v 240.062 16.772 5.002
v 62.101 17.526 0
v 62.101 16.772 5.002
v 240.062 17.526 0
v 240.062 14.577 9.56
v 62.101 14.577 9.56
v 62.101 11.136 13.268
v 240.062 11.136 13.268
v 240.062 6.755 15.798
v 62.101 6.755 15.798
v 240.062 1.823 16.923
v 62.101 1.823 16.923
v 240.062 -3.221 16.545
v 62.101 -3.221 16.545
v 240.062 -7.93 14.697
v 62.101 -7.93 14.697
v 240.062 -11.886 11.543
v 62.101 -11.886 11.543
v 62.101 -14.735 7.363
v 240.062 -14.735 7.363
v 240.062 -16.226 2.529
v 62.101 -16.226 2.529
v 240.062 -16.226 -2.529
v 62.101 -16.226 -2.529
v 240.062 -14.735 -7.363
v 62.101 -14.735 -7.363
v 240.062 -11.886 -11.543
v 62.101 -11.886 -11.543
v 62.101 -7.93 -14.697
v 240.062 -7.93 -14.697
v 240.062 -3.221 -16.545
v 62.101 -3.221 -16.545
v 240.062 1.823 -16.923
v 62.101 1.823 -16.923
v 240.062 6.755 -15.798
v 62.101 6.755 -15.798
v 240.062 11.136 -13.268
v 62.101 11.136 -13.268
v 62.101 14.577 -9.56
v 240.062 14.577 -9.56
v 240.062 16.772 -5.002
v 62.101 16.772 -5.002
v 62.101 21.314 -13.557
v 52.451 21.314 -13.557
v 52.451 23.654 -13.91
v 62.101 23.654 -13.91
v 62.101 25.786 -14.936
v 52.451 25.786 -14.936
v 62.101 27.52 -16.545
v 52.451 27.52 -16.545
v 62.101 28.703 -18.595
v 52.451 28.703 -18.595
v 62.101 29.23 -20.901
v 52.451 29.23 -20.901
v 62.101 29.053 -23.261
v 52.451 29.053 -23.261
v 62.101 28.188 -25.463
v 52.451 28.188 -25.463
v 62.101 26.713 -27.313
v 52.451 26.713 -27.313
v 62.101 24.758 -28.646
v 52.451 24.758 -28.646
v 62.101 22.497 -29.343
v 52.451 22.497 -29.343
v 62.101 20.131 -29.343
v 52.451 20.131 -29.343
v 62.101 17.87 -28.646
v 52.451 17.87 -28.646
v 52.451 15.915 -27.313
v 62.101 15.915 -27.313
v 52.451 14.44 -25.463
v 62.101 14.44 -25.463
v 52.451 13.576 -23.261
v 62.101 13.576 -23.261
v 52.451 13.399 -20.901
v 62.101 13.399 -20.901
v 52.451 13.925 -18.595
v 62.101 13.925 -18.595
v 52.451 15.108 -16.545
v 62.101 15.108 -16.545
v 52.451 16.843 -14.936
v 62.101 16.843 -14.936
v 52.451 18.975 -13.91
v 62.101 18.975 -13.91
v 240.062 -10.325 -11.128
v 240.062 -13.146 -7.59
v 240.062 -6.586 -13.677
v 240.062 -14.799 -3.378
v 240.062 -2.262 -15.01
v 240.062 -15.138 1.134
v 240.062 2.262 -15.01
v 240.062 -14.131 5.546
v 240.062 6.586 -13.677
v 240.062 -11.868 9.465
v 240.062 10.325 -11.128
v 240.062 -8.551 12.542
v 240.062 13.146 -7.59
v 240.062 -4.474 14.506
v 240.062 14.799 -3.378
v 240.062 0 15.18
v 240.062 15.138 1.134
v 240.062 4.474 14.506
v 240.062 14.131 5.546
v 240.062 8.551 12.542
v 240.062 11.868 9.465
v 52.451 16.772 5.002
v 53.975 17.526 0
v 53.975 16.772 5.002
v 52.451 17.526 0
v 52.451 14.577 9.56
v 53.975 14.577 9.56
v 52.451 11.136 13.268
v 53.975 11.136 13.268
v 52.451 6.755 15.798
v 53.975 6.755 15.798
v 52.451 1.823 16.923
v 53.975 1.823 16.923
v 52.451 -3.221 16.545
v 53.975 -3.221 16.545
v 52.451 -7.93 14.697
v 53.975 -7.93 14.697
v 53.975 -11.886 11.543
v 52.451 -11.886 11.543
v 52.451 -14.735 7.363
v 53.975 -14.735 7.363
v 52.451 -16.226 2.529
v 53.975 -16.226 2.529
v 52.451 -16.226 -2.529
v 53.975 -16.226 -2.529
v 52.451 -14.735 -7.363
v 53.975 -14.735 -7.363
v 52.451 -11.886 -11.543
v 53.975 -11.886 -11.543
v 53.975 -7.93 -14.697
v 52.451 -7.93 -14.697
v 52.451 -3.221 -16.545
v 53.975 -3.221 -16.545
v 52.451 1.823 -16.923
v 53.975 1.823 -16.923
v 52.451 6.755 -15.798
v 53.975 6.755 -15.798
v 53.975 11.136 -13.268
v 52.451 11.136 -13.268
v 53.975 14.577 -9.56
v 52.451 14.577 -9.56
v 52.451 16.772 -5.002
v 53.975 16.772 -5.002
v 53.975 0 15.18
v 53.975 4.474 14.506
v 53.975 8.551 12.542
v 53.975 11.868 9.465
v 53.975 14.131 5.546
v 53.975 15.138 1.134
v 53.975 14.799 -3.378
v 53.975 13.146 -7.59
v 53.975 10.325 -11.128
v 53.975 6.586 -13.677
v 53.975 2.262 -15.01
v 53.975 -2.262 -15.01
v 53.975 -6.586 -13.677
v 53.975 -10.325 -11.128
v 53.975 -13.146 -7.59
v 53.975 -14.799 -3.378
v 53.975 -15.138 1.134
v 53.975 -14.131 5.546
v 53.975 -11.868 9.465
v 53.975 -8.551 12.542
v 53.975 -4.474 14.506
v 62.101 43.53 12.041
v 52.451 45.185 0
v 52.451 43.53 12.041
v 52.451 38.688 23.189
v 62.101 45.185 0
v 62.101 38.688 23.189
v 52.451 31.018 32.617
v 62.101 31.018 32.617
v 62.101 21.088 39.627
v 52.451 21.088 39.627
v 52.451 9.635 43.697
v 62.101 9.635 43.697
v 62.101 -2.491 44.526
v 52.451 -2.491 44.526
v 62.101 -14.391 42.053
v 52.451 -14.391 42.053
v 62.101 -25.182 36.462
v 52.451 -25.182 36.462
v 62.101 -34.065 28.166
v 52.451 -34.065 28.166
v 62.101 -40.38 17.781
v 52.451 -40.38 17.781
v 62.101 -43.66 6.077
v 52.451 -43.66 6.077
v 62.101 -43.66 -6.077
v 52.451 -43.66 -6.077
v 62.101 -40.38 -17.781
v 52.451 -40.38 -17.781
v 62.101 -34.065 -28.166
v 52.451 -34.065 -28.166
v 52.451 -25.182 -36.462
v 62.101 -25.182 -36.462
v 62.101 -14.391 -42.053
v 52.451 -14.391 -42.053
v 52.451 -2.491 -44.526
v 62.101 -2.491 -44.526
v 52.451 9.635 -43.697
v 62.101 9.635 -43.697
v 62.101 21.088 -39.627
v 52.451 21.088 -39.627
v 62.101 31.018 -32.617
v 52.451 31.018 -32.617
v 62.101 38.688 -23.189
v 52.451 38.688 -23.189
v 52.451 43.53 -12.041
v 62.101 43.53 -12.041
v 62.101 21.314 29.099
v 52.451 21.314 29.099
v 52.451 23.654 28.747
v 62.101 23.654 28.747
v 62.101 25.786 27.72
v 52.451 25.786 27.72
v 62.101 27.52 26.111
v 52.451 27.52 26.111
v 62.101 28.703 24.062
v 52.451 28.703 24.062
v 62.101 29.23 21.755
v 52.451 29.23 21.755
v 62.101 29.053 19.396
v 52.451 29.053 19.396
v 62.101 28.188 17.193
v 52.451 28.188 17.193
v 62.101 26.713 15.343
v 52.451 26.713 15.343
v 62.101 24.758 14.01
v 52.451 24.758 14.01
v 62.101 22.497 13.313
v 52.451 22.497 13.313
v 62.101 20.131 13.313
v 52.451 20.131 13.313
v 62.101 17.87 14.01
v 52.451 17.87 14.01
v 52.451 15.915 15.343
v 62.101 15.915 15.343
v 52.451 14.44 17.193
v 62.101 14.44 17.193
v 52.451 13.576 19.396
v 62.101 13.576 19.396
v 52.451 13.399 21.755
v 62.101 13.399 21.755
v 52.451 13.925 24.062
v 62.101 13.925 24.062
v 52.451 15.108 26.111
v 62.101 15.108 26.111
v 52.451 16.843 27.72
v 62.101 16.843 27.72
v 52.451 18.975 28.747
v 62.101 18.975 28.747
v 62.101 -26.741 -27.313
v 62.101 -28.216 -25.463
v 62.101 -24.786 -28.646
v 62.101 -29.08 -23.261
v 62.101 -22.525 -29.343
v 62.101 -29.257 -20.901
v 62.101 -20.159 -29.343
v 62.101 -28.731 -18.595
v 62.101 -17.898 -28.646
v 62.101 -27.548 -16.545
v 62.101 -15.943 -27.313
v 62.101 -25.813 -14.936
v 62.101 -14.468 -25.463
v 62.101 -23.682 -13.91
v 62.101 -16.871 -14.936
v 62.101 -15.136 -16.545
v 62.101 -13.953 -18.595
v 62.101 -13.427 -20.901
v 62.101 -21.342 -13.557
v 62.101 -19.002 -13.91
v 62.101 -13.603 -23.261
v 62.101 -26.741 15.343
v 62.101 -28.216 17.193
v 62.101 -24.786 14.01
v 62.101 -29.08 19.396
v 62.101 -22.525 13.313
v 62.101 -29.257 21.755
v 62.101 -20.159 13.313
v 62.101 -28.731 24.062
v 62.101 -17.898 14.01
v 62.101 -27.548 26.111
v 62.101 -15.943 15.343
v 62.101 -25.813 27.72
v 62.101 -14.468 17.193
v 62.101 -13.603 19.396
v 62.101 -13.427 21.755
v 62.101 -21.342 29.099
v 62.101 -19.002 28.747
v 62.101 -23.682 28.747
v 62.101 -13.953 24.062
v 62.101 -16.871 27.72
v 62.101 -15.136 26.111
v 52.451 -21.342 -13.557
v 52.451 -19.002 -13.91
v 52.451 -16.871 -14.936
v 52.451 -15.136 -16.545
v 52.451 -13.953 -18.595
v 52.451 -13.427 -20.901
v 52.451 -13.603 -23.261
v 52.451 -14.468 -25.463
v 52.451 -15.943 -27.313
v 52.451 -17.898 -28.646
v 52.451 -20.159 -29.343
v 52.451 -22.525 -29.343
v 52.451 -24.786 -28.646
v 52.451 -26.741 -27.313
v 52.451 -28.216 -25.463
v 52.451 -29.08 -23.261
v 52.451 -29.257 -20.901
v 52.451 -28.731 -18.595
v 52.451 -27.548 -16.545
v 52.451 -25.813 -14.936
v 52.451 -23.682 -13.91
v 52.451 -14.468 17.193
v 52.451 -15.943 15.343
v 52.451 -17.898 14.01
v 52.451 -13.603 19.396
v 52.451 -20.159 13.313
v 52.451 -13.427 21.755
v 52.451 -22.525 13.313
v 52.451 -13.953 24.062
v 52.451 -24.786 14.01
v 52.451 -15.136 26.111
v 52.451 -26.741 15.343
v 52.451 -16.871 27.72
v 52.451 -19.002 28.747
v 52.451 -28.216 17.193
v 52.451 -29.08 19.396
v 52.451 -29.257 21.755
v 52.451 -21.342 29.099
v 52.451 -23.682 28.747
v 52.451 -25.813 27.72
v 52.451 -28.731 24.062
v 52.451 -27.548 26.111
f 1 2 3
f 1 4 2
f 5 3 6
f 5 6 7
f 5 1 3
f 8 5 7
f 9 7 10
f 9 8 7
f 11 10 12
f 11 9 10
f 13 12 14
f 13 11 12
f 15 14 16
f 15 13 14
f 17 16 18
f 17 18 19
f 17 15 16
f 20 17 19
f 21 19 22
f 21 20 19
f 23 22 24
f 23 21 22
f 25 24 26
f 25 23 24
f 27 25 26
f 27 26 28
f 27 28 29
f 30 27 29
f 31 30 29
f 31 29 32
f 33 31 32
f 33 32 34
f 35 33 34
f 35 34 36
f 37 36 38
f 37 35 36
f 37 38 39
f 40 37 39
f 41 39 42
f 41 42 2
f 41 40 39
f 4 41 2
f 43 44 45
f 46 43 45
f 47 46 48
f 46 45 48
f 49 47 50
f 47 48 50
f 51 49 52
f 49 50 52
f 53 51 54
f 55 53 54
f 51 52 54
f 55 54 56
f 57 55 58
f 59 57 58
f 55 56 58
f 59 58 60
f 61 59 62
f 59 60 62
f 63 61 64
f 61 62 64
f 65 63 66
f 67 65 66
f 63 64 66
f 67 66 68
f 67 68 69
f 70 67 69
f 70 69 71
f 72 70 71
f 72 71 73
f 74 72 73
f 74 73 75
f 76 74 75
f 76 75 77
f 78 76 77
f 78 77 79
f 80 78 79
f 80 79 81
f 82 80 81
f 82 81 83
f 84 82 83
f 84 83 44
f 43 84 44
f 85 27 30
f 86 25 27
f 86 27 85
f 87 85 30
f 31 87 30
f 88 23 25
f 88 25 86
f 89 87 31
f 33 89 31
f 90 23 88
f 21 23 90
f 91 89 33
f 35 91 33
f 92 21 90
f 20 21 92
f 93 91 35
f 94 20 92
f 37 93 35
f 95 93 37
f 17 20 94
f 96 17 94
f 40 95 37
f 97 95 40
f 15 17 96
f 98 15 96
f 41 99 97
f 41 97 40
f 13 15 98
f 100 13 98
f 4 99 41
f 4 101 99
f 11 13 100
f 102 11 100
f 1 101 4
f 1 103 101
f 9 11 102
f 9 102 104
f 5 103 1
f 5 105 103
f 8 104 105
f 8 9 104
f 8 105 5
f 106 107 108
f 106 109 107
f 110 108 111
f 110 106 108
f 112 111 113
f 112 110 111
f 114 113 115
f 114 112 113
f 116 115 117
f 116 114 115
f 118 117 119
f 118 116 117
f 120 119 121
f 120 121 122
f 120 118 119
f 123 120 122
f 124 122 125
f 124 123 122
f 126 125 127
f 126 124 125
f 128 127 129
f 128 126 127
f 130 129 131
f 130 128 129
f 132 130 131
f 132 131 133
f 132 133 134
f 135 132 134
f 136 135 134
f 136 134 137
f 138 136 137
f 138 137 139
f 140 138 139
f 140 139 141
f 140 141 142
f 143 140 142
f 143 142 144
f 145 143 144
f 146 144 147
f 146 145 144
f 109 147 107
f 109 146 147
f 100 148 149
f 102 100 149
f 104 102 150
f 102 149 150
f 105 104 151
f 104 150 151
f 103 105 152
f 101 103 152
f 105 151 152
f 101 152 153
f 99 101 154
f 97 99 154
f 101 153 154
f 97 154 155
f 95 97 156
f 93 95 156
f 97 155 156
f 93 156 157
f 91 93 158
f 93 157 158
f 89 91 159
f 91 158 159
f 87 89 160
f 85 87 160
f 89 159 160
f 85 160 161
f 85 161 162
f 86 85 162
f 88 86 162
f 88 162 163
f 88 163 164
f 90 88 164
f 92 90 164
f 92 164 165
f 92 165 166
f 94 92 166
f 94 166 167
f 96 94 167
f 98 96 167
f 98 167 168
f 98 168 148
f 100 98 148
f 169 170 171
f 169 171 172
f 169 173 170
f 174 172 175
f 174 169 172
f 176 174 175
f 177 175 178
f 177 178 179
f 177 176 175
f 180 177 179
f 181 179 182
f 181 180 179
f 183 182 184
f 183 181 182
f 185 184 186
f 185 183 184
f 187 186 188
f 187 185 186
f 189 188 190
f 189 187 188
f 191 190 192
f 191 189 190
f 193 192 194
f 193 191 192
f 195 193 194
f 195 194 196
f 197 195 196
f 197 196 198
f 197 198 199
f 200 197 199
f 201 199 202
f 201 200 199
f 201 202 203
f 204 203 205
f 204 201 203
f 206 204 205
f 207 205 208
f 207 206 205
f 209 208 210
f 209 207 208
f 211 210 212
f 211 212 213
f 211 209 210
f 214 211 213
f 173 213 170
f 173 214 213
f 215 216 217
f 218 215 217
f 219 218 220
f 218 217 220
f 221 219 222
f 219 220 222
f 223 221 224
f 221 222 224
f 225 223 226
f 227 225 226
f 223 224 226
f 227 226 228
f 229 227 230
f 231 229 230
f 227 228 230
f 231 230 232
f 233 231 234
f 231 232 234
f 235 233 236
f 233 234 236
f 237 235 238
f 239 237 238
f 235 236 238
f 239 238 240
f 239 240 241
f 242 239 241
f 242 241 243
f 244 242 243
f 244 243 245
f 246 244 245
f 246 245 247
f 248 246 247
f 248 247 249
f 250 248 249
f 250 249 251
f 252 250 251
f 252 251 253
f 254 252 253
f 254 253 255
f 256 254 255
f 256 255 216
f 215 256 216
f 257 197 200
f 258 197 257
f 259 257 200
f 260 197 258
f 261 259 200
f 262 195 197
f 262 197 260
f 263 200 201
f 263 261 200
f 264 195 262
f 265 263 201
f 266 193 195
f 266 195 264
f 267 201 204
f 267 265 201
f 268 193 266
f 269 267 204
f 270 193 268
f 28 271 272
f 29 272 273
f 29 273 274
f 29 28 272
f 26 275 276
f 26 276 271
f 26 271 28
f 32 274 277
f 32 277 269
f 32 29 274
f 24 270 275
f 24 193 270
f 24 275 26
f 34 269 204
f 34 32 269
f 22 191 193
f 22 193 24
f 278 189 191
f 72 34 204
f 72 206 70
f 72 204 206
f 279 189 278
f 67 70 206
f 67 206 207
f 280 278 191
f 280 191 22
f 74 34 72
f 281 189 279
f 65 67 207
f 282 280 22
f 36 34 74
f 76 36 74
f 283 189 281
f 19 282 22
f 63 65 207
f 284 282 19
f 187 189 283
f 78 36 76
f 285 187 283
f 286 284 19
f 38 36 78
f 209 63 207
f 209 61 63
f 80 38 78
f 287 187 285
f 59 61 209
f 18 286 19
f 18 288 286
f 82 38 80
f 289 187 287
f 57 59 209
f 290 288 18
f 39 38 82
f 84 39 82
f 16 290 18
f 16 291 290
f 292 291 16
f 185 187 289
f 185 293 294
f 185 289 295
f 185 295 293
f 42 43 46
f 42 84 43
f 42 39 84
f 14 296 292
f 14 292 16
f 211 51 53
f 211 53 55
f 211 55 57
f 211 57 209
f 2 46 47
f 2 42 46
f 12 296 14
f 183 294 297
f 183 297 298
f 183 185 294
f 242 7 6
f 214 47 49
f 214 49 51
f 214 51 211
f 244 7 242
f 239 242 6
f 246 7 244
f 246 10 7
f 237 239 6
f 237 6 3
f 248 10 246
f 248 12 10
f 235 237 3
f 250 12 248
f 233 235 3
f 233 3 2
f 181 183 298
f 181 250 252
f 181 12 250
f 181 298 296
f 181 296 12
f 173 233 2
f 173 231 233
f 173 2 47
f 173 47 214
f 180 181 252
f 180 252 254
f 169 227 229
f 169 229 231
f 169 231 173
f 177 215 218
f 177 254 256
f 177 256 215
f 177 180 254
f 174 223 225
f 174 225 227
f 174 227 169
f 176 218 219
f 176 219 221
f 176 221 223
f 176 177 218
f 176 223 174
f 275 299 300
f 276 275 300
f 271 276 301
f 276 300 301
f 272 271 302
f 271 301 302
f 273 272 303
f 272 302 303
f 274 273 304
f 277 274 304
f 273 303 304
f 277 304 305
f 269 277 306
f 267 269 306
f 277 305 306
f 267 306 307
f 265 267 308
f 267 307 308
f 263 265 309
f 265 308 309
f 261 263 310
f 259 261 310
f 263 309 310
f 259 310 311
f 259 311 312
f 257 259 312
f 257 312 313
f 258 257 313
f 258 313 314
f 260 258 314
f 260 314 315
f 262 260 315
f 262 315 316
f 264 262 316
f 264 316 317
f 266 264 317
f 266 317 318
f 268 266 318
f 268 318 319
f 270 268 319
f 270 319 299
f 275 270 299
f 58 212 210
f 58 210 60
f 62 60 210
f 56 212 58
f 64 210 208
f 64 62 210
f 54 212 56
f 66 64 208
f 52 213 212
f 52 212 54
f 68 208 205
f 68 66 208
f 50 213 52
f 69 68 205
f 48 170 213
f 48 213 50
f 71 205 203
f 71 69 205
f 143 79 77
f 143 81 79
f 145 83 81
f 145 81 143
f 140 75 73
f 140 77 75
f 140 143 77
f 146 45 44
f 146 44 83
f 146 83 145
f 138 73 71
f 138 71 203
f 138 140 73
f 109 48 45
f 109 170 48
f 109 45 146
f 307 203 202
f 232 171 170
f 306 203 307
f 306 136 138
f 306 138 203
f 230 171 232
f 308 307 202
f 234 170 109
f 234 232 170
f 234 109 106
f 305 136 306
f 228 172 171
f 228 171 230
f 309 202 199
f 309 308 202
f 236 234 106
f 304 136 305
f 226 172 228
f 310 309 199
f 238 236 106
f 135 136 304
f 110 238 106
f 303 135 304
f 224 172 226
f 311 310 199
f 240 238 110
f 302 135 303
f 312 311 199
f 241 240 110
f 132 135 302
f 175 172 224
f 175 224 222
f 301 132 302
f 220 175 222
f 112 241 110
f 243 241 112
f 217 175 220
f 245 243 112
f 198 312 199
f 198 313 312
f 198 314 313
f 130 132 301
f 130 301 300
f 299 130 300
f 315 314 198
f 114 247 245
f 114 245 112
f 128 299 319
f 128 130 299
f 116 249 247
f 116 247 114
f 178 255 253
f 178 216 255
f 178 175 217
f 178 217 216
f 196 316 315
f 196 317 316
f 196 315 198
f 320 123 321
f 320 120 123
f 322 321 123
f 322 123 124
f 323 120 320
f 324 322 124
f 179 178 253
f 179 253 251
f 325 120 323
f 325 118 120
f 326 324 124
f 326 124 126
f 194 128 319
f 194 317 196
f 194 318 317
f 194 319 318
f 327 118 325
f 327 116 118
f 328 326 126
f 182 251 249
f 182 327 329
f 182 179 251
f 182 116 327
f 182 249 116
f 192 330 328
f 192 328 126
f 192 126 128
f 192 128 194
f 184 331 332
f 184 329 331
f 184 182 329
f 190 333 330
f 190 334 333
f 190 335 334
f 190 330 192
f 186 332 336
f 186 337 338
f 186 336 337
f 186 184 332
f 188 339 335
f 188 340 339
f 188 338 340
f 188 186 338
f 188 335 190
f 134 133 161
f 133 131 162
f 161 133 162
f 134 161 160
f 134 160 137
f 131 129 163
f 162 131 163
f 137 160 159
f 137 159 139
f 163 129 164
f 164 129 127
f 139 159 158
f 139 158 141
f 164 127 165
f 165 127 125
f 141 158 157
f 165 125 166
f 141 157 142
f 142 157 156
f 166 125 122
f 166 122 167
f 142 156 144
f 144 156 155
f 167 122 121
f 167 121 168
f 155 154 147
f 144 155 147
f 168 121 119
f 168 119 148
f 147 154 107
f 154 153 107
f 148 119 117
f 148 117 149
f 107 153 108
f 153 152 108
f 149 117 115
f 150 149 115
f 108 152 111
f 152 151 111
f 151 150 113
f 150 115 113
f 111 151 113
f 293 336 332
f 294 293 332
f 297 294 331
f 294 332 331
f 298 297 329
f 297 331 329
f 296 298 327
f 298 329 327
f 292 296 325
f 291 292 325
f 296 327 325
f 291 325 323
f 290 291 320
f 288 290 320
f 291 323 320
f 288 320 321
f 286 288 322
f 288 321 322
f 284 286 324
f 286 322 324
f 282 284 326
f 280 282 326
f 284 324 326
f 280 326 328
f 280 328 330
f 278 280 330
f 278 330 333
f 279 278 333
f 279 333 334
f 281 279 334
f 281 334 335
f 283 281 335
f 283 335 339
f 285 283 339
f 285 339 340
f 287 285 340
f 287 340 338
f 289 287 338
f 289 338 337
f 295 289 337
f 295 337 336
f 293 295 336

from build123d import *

# Parameters (mm, degrees)
SKETCH3_R          = 15.18
CUT_EXTRUDE1_DEPTH = 187.086523502
SKETCH5_R          = 7.9375
CUT_EXTRUDE2_DEPTH = 10


with BuildPart() as part:
    # Sketch1 → Revolve1 (revolve)
    with BuildSketch(Plane.XY):
        Polygon((53.975, 0.555053367), (53.975, 11.176), (53.975, 17.526), (52.451, 17.526), (52.451, 45.185378607), (62.101, 45.185378607), (62.101, 17.526), (240.061523502, 17.526), (240.061523502, 0.555053367), align=None)
    revolve(axis=Axis((53.975, 0.555053367, 0), (1, 0, 0)))

    # Sketch3 → Cut-Extrude1 (cut, through all)
    with BuildSketch(Plane.ZY.offset(-53.975)):
        Circle(SKETCH3_R)
    extrude(amount=-CUT_EXTRUDE1_DEPTH, mode=Mode.SUBTRACT)

    # Sketch5 → Cut-Extrude2 (cut)
    with BuildSketch(Plane.ZY.offset(-52.451)):
        with Locations((-21.49441643, 21.314234902)):
            Circle(SKETCH5_R)
        with Locations((-21.49441643, -21.341981673)):
            Circle(SKETCH5_R)
        with Locations((21.161800145, 21.314234902)):
            Circle(SKETCH5_R)
        with Locations((21.161800145, -21.341981673)):
            Circle(SKETCH5_R)
    extrude(amount=-CUT_EXTRUDE2_DEPTH, mode=Mode.SUBTRACT)


solid = part.part
